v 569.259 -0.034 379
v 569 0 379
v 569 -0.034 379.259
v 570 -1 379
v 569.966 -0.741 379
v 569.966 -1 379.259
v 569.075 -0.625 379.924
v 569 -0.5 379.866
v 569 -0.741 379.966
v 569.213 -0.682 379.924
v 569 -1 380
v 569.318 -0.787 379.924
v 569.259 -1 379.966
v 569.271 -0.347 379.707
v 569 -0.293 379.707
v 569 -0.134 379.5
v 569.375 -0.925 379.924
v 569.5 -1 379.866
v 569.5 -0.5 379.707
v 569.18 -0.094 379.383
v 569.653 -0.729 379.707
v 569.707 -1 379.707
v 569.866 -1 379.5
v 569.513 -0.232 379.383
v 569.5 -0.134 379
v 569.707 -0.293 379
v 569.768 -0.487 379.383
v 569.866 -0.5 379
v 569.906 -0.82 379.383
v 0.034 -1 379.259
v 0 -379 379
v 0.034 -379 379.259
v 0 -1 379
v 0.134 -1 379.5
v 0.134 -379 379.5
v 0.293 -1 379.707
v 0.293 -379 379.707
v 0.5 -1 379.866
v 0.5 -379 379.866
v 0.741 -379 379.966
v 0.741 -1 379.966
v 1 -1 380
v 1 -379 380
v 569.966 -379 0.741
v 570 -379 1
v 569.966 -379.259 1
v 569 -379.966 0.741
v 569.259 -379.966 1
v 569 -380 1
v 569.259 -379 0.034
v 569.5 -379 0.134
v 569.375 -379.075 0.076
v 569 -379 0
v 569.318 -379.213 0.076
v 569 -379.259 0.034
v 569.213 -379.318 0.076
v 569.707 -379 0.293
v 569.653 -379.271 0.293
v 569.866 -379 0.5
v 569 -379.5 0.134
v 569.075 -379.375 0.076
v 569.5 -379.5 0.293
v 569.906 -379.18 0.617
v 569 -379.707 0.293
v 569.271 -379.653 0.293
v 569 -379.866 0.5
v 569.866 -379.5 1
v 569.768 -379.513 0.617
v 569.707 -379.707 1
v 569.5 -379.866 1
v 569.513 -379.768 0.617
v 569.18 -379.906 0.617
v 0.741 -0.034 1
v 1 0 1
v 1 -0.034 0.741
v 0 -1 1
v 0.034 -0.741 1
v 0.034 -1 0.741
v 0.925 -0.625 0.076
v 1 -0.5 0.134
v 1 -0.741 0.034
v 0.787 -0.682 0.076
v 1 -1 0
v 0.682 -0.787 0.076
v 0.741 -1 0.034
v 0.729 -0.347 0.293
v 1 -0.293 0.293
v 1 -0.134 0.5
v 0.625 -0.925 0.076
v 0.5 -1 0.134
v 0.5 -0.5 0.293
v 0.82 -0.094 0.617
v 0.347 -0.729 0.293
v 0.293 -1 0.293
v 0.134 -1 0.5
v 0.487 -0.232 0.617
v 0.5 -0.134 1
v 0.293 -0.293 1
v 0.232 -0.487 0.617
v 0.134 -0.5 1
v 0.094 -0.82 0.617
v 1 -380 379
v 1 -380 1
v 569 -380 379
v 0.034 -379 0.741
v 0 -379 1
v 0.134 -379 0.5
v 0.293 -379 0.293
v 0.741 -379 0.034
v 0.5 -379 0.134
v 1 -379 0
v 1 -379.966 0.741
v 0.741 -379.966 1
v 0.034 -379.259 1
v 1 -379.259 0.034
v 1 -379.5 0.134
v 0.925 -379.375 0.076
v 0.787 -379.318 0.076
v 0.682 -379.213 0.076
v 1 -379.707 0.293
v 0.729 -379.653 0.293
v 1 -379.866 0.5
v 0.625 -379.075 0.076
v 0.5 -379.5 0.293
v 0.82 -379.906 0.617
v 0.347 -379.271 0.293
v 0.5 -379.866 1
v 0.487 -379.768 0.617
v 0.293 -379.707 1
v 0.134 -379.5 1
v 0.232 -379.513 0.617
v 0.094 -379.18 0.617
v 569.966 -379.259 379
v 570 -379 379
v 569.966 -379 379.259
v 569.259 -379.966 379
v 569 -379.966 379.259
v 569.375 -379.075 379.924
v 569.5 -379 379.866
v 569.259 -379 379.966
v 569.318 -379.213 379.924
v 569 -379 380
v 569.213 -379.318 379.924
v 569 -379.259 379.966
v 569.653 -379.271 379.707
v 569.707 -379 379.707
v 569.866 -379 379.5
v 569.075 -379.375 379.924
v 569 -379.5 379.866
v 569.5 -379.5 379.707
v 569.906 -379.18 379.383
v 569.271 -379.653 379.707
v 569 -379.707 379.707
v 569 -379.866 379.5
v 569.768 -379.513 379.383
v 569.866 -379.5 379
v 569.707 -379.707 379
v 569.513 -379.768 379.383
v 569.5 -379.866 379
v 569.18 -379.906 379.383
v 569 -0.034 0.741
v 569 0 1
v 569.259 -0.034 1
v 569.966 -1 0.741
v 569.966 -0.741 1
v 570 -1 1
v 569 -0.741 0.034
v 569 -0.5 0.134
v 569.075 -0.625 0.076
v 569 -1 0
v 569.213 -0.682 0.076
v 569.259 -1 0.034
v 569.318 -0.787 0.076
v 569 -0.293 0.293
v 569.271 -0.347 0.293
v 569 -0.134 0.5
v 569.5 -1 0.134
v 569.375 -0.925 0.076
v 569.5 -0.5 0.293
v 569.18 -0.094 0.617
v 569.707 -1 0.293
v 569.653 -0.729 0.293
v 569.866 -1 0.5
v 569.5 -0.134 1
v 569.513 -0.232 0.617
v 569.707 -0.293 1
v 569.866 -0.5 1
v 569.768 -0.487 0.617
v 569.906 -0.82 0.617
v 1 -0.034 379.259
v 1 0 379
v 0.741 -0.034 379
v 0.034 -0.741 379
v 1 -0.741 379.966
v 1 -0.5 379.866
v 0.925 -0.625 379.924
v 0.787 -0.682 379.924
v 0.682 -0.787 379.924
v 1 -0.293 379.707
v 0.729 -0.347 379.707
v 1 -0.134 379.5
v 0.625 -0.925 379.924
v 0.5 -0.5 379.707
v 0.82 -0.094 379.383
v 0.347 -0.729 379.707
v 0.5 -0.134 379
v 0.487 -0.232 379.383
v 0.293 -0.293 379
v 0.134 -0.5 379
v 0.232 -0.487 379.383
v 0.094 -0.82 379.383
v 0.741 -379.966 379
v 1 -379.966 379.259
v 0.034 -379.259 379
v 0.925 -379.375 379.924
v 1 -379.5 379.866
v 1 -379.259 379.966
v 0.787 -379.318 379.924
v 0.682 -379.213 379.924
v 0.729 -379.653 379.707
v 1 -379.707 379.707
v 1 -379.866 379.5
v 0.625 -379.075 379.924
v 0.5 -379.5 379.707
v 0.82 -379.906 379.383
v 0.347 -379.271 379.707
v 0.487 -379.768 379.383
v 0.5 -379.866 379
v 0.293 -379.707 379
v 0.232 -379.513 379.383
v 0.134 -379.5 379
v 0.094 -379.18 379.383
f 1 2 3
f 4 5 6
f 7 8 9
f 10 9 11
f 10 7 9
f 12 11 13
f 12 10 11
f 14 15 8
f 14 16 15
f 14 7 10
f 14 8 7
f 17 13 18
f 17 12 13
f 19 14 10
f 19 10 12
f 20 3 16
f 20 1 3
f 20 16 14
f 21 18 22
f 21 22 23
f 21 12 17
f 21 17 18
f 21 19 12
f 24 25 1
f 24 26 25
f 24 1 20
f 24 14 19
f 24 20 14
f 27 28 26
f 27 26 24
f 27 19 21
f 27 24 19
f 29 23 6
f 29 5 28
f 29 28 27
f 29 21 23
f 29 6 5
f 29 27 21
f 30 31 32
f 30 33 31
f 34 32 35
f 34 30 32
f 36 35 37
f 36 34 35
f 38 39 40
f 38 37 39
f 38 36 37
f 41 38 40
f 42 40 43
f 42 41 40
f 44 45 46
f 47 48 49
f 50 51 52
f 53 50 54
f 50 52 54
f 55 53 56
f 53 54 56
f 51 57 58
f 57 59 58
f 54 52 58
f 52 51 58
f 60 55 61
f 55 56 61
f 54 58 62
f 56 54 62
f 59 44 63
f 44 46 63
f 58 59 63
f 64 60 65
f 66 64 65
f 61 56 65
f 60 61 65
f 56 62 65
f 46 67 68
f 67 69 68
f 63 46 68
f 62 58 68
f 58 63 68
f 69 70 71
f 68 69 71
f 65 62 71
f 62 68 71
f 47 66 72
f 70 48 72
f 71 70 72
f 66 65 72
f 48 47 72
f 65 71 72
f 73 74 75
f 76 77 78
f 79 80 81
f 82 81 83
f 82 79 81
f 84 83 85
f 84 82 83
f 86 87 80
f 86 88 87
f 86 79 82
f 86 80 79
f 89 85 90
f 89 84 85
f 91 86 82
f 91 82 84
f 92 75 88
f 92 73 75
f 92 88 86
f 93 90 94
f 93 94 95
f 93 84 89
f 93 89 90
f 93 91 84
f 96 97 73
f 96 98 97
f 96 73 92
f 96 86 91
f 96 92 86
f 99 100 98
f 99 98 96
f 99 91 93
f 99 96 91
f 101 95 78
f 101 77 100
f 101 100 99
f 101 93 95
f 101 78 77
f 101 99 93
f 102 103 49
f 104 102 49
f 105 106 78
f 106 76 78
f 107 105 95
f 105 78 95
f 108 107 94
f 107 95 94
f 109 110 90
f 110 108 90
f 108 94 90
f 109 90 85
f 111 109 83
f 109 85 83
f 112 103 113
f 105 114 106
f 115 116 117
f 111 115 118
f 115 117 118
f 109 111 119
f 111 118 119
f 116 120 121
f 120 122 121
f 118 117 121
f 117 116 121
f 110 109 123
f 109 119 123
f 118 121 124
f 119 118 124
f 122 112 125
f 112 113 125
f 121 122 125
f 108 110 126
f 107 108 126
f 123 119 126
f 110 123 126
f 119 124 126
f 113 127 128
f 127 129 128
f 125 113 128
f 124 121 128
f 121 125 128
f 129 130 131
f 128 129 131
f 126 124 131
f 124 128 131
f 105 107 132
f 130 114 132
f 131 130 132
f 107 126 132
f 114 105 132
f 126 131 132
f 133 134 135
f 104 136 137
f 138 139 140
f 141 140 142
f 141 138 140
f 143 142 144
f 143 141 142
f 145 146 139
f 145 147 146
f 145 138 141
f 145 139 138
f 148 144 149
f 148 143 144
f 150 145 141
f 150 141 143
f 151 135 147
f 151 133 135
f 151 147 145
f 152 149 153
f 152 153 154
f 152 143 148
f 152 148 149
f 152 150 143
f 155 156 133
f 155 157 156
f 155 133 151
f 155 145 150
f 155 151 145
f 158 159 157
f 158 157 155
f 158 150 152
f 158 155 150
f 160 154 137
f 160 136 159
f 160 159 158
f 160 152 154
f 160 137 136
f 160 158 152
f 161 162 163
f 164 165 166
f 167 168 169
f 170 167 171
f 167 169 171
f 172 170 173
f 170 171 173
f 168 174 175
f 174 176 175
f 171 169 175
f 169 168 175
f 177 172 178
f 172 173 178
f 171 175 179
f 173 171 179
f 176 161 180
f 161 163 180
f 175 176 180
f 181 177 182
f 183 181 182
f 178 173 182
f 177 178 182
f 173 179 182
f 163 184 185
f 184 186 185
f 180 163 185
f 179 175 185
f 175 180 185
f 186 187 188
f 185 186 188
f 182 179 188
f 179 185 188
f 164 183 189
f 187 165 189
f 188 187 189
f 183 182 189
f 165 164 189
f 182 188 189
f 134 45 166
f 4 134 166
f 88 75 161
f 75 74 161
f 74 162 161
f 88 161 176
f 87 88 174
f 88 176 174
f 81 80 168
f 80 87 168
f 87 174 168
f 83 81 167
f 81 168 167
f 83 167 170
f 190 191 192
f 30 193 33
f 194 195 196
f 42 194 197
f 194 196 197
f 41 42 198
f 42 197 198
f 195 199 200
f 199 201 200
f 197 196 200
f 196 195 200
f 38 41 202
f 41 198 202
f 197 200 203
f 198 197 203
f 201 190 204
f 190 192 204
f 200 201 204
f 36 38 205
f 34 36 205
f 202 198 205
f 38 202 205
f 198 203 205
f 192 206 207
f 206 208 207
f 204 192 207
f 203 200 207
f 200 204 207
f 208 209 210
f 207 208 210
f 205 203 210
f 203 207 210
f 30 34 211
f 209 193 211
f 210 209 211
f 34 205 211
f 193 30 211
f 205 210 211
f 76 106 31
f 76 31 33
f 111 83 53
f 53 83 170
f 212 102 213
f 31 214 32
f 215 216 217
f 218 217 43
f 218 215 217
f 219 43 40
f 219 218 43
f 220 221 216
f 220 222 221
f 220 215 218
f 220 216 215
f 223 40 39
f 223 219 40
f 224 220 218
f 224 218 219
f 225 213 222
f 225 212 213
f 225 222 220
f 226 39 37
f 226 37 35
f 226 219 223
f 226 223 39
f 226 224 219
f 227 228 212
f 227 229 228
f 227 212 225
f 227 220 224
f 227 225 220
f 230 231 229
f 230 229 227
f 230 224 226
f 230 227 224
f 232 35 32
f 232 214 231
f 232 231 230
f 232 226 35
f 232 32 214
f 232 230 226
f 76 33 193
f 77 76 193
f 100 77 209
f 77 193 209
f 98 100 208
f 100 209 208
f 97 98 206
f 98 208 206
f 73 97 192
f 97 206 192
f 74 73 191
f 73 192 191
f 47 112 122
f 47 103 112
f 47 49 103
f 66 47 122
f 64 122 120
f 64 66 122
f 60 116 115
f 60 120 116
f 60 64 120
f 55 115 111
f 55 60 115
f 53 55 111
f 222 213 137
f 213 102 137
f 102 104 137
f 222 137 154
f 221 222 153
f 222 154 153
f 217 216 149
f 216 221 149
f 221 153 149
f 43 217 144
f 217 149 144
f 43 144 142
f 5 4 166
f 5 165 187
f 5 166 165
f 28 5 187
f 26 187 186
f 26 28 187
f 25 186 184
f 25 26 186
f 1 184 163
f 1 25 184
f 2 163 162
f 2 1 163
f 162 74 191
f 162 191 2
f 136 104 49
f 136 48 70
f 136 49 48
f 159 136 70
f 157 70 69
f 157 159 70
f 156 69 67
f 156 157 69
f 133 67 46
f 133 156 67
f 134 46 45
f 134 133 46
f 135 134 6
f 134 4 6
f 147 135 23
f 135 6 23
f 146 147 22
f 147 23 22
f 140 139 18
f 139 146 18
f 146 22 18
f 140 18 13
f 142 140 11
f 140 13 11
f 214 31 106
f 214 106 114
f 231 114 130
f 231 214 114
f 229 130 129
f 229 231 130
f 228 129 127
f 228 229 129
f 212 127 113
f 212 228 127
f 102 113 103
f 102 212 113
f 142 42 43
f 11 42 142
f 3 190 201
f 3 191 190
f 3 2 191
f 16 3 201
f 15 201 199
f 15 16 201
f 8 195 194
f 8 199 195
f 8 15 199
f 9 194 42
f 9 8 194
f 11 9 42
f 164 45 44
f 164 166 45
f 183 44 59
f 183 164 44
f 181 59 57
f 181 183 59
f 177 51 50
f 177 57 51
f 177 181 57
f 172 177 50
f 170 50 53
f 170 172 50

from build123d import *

# Parameters (mm, degrees)
SKETCH_W  = 570
SKETCH_H  = 380
PAD_DEPTH = 380
FILLET_R  = 1


with BuildPart() as part:
    # Sketch → Pad (new body)
    with BuildSketch(Plane.XY):
        with Locations((285, -190)):
            Rectangle(SKETCH_W, SKETCH_H)
    extrude(amount=PAD_DEPTH)

    # Fillet
    fillet_edges = [part.edges().sort_by_distance(p)[0] for p in [
        (0, 0, 190),
        (570, 0, 190),
        (285, 0, 0),
        (285, 0, 380),
        (570, -380, 190),
        (570, -190, 0),
        (570, -190, 380),
        (0, -380, 190),
        (285, -380, 0),
        (285, -380, 380),
        (0, -190, 0),
        (0, -190, 380),
    ]]
    fillet(fillet_edges, radius=FILLET_R)


solid = part.part
